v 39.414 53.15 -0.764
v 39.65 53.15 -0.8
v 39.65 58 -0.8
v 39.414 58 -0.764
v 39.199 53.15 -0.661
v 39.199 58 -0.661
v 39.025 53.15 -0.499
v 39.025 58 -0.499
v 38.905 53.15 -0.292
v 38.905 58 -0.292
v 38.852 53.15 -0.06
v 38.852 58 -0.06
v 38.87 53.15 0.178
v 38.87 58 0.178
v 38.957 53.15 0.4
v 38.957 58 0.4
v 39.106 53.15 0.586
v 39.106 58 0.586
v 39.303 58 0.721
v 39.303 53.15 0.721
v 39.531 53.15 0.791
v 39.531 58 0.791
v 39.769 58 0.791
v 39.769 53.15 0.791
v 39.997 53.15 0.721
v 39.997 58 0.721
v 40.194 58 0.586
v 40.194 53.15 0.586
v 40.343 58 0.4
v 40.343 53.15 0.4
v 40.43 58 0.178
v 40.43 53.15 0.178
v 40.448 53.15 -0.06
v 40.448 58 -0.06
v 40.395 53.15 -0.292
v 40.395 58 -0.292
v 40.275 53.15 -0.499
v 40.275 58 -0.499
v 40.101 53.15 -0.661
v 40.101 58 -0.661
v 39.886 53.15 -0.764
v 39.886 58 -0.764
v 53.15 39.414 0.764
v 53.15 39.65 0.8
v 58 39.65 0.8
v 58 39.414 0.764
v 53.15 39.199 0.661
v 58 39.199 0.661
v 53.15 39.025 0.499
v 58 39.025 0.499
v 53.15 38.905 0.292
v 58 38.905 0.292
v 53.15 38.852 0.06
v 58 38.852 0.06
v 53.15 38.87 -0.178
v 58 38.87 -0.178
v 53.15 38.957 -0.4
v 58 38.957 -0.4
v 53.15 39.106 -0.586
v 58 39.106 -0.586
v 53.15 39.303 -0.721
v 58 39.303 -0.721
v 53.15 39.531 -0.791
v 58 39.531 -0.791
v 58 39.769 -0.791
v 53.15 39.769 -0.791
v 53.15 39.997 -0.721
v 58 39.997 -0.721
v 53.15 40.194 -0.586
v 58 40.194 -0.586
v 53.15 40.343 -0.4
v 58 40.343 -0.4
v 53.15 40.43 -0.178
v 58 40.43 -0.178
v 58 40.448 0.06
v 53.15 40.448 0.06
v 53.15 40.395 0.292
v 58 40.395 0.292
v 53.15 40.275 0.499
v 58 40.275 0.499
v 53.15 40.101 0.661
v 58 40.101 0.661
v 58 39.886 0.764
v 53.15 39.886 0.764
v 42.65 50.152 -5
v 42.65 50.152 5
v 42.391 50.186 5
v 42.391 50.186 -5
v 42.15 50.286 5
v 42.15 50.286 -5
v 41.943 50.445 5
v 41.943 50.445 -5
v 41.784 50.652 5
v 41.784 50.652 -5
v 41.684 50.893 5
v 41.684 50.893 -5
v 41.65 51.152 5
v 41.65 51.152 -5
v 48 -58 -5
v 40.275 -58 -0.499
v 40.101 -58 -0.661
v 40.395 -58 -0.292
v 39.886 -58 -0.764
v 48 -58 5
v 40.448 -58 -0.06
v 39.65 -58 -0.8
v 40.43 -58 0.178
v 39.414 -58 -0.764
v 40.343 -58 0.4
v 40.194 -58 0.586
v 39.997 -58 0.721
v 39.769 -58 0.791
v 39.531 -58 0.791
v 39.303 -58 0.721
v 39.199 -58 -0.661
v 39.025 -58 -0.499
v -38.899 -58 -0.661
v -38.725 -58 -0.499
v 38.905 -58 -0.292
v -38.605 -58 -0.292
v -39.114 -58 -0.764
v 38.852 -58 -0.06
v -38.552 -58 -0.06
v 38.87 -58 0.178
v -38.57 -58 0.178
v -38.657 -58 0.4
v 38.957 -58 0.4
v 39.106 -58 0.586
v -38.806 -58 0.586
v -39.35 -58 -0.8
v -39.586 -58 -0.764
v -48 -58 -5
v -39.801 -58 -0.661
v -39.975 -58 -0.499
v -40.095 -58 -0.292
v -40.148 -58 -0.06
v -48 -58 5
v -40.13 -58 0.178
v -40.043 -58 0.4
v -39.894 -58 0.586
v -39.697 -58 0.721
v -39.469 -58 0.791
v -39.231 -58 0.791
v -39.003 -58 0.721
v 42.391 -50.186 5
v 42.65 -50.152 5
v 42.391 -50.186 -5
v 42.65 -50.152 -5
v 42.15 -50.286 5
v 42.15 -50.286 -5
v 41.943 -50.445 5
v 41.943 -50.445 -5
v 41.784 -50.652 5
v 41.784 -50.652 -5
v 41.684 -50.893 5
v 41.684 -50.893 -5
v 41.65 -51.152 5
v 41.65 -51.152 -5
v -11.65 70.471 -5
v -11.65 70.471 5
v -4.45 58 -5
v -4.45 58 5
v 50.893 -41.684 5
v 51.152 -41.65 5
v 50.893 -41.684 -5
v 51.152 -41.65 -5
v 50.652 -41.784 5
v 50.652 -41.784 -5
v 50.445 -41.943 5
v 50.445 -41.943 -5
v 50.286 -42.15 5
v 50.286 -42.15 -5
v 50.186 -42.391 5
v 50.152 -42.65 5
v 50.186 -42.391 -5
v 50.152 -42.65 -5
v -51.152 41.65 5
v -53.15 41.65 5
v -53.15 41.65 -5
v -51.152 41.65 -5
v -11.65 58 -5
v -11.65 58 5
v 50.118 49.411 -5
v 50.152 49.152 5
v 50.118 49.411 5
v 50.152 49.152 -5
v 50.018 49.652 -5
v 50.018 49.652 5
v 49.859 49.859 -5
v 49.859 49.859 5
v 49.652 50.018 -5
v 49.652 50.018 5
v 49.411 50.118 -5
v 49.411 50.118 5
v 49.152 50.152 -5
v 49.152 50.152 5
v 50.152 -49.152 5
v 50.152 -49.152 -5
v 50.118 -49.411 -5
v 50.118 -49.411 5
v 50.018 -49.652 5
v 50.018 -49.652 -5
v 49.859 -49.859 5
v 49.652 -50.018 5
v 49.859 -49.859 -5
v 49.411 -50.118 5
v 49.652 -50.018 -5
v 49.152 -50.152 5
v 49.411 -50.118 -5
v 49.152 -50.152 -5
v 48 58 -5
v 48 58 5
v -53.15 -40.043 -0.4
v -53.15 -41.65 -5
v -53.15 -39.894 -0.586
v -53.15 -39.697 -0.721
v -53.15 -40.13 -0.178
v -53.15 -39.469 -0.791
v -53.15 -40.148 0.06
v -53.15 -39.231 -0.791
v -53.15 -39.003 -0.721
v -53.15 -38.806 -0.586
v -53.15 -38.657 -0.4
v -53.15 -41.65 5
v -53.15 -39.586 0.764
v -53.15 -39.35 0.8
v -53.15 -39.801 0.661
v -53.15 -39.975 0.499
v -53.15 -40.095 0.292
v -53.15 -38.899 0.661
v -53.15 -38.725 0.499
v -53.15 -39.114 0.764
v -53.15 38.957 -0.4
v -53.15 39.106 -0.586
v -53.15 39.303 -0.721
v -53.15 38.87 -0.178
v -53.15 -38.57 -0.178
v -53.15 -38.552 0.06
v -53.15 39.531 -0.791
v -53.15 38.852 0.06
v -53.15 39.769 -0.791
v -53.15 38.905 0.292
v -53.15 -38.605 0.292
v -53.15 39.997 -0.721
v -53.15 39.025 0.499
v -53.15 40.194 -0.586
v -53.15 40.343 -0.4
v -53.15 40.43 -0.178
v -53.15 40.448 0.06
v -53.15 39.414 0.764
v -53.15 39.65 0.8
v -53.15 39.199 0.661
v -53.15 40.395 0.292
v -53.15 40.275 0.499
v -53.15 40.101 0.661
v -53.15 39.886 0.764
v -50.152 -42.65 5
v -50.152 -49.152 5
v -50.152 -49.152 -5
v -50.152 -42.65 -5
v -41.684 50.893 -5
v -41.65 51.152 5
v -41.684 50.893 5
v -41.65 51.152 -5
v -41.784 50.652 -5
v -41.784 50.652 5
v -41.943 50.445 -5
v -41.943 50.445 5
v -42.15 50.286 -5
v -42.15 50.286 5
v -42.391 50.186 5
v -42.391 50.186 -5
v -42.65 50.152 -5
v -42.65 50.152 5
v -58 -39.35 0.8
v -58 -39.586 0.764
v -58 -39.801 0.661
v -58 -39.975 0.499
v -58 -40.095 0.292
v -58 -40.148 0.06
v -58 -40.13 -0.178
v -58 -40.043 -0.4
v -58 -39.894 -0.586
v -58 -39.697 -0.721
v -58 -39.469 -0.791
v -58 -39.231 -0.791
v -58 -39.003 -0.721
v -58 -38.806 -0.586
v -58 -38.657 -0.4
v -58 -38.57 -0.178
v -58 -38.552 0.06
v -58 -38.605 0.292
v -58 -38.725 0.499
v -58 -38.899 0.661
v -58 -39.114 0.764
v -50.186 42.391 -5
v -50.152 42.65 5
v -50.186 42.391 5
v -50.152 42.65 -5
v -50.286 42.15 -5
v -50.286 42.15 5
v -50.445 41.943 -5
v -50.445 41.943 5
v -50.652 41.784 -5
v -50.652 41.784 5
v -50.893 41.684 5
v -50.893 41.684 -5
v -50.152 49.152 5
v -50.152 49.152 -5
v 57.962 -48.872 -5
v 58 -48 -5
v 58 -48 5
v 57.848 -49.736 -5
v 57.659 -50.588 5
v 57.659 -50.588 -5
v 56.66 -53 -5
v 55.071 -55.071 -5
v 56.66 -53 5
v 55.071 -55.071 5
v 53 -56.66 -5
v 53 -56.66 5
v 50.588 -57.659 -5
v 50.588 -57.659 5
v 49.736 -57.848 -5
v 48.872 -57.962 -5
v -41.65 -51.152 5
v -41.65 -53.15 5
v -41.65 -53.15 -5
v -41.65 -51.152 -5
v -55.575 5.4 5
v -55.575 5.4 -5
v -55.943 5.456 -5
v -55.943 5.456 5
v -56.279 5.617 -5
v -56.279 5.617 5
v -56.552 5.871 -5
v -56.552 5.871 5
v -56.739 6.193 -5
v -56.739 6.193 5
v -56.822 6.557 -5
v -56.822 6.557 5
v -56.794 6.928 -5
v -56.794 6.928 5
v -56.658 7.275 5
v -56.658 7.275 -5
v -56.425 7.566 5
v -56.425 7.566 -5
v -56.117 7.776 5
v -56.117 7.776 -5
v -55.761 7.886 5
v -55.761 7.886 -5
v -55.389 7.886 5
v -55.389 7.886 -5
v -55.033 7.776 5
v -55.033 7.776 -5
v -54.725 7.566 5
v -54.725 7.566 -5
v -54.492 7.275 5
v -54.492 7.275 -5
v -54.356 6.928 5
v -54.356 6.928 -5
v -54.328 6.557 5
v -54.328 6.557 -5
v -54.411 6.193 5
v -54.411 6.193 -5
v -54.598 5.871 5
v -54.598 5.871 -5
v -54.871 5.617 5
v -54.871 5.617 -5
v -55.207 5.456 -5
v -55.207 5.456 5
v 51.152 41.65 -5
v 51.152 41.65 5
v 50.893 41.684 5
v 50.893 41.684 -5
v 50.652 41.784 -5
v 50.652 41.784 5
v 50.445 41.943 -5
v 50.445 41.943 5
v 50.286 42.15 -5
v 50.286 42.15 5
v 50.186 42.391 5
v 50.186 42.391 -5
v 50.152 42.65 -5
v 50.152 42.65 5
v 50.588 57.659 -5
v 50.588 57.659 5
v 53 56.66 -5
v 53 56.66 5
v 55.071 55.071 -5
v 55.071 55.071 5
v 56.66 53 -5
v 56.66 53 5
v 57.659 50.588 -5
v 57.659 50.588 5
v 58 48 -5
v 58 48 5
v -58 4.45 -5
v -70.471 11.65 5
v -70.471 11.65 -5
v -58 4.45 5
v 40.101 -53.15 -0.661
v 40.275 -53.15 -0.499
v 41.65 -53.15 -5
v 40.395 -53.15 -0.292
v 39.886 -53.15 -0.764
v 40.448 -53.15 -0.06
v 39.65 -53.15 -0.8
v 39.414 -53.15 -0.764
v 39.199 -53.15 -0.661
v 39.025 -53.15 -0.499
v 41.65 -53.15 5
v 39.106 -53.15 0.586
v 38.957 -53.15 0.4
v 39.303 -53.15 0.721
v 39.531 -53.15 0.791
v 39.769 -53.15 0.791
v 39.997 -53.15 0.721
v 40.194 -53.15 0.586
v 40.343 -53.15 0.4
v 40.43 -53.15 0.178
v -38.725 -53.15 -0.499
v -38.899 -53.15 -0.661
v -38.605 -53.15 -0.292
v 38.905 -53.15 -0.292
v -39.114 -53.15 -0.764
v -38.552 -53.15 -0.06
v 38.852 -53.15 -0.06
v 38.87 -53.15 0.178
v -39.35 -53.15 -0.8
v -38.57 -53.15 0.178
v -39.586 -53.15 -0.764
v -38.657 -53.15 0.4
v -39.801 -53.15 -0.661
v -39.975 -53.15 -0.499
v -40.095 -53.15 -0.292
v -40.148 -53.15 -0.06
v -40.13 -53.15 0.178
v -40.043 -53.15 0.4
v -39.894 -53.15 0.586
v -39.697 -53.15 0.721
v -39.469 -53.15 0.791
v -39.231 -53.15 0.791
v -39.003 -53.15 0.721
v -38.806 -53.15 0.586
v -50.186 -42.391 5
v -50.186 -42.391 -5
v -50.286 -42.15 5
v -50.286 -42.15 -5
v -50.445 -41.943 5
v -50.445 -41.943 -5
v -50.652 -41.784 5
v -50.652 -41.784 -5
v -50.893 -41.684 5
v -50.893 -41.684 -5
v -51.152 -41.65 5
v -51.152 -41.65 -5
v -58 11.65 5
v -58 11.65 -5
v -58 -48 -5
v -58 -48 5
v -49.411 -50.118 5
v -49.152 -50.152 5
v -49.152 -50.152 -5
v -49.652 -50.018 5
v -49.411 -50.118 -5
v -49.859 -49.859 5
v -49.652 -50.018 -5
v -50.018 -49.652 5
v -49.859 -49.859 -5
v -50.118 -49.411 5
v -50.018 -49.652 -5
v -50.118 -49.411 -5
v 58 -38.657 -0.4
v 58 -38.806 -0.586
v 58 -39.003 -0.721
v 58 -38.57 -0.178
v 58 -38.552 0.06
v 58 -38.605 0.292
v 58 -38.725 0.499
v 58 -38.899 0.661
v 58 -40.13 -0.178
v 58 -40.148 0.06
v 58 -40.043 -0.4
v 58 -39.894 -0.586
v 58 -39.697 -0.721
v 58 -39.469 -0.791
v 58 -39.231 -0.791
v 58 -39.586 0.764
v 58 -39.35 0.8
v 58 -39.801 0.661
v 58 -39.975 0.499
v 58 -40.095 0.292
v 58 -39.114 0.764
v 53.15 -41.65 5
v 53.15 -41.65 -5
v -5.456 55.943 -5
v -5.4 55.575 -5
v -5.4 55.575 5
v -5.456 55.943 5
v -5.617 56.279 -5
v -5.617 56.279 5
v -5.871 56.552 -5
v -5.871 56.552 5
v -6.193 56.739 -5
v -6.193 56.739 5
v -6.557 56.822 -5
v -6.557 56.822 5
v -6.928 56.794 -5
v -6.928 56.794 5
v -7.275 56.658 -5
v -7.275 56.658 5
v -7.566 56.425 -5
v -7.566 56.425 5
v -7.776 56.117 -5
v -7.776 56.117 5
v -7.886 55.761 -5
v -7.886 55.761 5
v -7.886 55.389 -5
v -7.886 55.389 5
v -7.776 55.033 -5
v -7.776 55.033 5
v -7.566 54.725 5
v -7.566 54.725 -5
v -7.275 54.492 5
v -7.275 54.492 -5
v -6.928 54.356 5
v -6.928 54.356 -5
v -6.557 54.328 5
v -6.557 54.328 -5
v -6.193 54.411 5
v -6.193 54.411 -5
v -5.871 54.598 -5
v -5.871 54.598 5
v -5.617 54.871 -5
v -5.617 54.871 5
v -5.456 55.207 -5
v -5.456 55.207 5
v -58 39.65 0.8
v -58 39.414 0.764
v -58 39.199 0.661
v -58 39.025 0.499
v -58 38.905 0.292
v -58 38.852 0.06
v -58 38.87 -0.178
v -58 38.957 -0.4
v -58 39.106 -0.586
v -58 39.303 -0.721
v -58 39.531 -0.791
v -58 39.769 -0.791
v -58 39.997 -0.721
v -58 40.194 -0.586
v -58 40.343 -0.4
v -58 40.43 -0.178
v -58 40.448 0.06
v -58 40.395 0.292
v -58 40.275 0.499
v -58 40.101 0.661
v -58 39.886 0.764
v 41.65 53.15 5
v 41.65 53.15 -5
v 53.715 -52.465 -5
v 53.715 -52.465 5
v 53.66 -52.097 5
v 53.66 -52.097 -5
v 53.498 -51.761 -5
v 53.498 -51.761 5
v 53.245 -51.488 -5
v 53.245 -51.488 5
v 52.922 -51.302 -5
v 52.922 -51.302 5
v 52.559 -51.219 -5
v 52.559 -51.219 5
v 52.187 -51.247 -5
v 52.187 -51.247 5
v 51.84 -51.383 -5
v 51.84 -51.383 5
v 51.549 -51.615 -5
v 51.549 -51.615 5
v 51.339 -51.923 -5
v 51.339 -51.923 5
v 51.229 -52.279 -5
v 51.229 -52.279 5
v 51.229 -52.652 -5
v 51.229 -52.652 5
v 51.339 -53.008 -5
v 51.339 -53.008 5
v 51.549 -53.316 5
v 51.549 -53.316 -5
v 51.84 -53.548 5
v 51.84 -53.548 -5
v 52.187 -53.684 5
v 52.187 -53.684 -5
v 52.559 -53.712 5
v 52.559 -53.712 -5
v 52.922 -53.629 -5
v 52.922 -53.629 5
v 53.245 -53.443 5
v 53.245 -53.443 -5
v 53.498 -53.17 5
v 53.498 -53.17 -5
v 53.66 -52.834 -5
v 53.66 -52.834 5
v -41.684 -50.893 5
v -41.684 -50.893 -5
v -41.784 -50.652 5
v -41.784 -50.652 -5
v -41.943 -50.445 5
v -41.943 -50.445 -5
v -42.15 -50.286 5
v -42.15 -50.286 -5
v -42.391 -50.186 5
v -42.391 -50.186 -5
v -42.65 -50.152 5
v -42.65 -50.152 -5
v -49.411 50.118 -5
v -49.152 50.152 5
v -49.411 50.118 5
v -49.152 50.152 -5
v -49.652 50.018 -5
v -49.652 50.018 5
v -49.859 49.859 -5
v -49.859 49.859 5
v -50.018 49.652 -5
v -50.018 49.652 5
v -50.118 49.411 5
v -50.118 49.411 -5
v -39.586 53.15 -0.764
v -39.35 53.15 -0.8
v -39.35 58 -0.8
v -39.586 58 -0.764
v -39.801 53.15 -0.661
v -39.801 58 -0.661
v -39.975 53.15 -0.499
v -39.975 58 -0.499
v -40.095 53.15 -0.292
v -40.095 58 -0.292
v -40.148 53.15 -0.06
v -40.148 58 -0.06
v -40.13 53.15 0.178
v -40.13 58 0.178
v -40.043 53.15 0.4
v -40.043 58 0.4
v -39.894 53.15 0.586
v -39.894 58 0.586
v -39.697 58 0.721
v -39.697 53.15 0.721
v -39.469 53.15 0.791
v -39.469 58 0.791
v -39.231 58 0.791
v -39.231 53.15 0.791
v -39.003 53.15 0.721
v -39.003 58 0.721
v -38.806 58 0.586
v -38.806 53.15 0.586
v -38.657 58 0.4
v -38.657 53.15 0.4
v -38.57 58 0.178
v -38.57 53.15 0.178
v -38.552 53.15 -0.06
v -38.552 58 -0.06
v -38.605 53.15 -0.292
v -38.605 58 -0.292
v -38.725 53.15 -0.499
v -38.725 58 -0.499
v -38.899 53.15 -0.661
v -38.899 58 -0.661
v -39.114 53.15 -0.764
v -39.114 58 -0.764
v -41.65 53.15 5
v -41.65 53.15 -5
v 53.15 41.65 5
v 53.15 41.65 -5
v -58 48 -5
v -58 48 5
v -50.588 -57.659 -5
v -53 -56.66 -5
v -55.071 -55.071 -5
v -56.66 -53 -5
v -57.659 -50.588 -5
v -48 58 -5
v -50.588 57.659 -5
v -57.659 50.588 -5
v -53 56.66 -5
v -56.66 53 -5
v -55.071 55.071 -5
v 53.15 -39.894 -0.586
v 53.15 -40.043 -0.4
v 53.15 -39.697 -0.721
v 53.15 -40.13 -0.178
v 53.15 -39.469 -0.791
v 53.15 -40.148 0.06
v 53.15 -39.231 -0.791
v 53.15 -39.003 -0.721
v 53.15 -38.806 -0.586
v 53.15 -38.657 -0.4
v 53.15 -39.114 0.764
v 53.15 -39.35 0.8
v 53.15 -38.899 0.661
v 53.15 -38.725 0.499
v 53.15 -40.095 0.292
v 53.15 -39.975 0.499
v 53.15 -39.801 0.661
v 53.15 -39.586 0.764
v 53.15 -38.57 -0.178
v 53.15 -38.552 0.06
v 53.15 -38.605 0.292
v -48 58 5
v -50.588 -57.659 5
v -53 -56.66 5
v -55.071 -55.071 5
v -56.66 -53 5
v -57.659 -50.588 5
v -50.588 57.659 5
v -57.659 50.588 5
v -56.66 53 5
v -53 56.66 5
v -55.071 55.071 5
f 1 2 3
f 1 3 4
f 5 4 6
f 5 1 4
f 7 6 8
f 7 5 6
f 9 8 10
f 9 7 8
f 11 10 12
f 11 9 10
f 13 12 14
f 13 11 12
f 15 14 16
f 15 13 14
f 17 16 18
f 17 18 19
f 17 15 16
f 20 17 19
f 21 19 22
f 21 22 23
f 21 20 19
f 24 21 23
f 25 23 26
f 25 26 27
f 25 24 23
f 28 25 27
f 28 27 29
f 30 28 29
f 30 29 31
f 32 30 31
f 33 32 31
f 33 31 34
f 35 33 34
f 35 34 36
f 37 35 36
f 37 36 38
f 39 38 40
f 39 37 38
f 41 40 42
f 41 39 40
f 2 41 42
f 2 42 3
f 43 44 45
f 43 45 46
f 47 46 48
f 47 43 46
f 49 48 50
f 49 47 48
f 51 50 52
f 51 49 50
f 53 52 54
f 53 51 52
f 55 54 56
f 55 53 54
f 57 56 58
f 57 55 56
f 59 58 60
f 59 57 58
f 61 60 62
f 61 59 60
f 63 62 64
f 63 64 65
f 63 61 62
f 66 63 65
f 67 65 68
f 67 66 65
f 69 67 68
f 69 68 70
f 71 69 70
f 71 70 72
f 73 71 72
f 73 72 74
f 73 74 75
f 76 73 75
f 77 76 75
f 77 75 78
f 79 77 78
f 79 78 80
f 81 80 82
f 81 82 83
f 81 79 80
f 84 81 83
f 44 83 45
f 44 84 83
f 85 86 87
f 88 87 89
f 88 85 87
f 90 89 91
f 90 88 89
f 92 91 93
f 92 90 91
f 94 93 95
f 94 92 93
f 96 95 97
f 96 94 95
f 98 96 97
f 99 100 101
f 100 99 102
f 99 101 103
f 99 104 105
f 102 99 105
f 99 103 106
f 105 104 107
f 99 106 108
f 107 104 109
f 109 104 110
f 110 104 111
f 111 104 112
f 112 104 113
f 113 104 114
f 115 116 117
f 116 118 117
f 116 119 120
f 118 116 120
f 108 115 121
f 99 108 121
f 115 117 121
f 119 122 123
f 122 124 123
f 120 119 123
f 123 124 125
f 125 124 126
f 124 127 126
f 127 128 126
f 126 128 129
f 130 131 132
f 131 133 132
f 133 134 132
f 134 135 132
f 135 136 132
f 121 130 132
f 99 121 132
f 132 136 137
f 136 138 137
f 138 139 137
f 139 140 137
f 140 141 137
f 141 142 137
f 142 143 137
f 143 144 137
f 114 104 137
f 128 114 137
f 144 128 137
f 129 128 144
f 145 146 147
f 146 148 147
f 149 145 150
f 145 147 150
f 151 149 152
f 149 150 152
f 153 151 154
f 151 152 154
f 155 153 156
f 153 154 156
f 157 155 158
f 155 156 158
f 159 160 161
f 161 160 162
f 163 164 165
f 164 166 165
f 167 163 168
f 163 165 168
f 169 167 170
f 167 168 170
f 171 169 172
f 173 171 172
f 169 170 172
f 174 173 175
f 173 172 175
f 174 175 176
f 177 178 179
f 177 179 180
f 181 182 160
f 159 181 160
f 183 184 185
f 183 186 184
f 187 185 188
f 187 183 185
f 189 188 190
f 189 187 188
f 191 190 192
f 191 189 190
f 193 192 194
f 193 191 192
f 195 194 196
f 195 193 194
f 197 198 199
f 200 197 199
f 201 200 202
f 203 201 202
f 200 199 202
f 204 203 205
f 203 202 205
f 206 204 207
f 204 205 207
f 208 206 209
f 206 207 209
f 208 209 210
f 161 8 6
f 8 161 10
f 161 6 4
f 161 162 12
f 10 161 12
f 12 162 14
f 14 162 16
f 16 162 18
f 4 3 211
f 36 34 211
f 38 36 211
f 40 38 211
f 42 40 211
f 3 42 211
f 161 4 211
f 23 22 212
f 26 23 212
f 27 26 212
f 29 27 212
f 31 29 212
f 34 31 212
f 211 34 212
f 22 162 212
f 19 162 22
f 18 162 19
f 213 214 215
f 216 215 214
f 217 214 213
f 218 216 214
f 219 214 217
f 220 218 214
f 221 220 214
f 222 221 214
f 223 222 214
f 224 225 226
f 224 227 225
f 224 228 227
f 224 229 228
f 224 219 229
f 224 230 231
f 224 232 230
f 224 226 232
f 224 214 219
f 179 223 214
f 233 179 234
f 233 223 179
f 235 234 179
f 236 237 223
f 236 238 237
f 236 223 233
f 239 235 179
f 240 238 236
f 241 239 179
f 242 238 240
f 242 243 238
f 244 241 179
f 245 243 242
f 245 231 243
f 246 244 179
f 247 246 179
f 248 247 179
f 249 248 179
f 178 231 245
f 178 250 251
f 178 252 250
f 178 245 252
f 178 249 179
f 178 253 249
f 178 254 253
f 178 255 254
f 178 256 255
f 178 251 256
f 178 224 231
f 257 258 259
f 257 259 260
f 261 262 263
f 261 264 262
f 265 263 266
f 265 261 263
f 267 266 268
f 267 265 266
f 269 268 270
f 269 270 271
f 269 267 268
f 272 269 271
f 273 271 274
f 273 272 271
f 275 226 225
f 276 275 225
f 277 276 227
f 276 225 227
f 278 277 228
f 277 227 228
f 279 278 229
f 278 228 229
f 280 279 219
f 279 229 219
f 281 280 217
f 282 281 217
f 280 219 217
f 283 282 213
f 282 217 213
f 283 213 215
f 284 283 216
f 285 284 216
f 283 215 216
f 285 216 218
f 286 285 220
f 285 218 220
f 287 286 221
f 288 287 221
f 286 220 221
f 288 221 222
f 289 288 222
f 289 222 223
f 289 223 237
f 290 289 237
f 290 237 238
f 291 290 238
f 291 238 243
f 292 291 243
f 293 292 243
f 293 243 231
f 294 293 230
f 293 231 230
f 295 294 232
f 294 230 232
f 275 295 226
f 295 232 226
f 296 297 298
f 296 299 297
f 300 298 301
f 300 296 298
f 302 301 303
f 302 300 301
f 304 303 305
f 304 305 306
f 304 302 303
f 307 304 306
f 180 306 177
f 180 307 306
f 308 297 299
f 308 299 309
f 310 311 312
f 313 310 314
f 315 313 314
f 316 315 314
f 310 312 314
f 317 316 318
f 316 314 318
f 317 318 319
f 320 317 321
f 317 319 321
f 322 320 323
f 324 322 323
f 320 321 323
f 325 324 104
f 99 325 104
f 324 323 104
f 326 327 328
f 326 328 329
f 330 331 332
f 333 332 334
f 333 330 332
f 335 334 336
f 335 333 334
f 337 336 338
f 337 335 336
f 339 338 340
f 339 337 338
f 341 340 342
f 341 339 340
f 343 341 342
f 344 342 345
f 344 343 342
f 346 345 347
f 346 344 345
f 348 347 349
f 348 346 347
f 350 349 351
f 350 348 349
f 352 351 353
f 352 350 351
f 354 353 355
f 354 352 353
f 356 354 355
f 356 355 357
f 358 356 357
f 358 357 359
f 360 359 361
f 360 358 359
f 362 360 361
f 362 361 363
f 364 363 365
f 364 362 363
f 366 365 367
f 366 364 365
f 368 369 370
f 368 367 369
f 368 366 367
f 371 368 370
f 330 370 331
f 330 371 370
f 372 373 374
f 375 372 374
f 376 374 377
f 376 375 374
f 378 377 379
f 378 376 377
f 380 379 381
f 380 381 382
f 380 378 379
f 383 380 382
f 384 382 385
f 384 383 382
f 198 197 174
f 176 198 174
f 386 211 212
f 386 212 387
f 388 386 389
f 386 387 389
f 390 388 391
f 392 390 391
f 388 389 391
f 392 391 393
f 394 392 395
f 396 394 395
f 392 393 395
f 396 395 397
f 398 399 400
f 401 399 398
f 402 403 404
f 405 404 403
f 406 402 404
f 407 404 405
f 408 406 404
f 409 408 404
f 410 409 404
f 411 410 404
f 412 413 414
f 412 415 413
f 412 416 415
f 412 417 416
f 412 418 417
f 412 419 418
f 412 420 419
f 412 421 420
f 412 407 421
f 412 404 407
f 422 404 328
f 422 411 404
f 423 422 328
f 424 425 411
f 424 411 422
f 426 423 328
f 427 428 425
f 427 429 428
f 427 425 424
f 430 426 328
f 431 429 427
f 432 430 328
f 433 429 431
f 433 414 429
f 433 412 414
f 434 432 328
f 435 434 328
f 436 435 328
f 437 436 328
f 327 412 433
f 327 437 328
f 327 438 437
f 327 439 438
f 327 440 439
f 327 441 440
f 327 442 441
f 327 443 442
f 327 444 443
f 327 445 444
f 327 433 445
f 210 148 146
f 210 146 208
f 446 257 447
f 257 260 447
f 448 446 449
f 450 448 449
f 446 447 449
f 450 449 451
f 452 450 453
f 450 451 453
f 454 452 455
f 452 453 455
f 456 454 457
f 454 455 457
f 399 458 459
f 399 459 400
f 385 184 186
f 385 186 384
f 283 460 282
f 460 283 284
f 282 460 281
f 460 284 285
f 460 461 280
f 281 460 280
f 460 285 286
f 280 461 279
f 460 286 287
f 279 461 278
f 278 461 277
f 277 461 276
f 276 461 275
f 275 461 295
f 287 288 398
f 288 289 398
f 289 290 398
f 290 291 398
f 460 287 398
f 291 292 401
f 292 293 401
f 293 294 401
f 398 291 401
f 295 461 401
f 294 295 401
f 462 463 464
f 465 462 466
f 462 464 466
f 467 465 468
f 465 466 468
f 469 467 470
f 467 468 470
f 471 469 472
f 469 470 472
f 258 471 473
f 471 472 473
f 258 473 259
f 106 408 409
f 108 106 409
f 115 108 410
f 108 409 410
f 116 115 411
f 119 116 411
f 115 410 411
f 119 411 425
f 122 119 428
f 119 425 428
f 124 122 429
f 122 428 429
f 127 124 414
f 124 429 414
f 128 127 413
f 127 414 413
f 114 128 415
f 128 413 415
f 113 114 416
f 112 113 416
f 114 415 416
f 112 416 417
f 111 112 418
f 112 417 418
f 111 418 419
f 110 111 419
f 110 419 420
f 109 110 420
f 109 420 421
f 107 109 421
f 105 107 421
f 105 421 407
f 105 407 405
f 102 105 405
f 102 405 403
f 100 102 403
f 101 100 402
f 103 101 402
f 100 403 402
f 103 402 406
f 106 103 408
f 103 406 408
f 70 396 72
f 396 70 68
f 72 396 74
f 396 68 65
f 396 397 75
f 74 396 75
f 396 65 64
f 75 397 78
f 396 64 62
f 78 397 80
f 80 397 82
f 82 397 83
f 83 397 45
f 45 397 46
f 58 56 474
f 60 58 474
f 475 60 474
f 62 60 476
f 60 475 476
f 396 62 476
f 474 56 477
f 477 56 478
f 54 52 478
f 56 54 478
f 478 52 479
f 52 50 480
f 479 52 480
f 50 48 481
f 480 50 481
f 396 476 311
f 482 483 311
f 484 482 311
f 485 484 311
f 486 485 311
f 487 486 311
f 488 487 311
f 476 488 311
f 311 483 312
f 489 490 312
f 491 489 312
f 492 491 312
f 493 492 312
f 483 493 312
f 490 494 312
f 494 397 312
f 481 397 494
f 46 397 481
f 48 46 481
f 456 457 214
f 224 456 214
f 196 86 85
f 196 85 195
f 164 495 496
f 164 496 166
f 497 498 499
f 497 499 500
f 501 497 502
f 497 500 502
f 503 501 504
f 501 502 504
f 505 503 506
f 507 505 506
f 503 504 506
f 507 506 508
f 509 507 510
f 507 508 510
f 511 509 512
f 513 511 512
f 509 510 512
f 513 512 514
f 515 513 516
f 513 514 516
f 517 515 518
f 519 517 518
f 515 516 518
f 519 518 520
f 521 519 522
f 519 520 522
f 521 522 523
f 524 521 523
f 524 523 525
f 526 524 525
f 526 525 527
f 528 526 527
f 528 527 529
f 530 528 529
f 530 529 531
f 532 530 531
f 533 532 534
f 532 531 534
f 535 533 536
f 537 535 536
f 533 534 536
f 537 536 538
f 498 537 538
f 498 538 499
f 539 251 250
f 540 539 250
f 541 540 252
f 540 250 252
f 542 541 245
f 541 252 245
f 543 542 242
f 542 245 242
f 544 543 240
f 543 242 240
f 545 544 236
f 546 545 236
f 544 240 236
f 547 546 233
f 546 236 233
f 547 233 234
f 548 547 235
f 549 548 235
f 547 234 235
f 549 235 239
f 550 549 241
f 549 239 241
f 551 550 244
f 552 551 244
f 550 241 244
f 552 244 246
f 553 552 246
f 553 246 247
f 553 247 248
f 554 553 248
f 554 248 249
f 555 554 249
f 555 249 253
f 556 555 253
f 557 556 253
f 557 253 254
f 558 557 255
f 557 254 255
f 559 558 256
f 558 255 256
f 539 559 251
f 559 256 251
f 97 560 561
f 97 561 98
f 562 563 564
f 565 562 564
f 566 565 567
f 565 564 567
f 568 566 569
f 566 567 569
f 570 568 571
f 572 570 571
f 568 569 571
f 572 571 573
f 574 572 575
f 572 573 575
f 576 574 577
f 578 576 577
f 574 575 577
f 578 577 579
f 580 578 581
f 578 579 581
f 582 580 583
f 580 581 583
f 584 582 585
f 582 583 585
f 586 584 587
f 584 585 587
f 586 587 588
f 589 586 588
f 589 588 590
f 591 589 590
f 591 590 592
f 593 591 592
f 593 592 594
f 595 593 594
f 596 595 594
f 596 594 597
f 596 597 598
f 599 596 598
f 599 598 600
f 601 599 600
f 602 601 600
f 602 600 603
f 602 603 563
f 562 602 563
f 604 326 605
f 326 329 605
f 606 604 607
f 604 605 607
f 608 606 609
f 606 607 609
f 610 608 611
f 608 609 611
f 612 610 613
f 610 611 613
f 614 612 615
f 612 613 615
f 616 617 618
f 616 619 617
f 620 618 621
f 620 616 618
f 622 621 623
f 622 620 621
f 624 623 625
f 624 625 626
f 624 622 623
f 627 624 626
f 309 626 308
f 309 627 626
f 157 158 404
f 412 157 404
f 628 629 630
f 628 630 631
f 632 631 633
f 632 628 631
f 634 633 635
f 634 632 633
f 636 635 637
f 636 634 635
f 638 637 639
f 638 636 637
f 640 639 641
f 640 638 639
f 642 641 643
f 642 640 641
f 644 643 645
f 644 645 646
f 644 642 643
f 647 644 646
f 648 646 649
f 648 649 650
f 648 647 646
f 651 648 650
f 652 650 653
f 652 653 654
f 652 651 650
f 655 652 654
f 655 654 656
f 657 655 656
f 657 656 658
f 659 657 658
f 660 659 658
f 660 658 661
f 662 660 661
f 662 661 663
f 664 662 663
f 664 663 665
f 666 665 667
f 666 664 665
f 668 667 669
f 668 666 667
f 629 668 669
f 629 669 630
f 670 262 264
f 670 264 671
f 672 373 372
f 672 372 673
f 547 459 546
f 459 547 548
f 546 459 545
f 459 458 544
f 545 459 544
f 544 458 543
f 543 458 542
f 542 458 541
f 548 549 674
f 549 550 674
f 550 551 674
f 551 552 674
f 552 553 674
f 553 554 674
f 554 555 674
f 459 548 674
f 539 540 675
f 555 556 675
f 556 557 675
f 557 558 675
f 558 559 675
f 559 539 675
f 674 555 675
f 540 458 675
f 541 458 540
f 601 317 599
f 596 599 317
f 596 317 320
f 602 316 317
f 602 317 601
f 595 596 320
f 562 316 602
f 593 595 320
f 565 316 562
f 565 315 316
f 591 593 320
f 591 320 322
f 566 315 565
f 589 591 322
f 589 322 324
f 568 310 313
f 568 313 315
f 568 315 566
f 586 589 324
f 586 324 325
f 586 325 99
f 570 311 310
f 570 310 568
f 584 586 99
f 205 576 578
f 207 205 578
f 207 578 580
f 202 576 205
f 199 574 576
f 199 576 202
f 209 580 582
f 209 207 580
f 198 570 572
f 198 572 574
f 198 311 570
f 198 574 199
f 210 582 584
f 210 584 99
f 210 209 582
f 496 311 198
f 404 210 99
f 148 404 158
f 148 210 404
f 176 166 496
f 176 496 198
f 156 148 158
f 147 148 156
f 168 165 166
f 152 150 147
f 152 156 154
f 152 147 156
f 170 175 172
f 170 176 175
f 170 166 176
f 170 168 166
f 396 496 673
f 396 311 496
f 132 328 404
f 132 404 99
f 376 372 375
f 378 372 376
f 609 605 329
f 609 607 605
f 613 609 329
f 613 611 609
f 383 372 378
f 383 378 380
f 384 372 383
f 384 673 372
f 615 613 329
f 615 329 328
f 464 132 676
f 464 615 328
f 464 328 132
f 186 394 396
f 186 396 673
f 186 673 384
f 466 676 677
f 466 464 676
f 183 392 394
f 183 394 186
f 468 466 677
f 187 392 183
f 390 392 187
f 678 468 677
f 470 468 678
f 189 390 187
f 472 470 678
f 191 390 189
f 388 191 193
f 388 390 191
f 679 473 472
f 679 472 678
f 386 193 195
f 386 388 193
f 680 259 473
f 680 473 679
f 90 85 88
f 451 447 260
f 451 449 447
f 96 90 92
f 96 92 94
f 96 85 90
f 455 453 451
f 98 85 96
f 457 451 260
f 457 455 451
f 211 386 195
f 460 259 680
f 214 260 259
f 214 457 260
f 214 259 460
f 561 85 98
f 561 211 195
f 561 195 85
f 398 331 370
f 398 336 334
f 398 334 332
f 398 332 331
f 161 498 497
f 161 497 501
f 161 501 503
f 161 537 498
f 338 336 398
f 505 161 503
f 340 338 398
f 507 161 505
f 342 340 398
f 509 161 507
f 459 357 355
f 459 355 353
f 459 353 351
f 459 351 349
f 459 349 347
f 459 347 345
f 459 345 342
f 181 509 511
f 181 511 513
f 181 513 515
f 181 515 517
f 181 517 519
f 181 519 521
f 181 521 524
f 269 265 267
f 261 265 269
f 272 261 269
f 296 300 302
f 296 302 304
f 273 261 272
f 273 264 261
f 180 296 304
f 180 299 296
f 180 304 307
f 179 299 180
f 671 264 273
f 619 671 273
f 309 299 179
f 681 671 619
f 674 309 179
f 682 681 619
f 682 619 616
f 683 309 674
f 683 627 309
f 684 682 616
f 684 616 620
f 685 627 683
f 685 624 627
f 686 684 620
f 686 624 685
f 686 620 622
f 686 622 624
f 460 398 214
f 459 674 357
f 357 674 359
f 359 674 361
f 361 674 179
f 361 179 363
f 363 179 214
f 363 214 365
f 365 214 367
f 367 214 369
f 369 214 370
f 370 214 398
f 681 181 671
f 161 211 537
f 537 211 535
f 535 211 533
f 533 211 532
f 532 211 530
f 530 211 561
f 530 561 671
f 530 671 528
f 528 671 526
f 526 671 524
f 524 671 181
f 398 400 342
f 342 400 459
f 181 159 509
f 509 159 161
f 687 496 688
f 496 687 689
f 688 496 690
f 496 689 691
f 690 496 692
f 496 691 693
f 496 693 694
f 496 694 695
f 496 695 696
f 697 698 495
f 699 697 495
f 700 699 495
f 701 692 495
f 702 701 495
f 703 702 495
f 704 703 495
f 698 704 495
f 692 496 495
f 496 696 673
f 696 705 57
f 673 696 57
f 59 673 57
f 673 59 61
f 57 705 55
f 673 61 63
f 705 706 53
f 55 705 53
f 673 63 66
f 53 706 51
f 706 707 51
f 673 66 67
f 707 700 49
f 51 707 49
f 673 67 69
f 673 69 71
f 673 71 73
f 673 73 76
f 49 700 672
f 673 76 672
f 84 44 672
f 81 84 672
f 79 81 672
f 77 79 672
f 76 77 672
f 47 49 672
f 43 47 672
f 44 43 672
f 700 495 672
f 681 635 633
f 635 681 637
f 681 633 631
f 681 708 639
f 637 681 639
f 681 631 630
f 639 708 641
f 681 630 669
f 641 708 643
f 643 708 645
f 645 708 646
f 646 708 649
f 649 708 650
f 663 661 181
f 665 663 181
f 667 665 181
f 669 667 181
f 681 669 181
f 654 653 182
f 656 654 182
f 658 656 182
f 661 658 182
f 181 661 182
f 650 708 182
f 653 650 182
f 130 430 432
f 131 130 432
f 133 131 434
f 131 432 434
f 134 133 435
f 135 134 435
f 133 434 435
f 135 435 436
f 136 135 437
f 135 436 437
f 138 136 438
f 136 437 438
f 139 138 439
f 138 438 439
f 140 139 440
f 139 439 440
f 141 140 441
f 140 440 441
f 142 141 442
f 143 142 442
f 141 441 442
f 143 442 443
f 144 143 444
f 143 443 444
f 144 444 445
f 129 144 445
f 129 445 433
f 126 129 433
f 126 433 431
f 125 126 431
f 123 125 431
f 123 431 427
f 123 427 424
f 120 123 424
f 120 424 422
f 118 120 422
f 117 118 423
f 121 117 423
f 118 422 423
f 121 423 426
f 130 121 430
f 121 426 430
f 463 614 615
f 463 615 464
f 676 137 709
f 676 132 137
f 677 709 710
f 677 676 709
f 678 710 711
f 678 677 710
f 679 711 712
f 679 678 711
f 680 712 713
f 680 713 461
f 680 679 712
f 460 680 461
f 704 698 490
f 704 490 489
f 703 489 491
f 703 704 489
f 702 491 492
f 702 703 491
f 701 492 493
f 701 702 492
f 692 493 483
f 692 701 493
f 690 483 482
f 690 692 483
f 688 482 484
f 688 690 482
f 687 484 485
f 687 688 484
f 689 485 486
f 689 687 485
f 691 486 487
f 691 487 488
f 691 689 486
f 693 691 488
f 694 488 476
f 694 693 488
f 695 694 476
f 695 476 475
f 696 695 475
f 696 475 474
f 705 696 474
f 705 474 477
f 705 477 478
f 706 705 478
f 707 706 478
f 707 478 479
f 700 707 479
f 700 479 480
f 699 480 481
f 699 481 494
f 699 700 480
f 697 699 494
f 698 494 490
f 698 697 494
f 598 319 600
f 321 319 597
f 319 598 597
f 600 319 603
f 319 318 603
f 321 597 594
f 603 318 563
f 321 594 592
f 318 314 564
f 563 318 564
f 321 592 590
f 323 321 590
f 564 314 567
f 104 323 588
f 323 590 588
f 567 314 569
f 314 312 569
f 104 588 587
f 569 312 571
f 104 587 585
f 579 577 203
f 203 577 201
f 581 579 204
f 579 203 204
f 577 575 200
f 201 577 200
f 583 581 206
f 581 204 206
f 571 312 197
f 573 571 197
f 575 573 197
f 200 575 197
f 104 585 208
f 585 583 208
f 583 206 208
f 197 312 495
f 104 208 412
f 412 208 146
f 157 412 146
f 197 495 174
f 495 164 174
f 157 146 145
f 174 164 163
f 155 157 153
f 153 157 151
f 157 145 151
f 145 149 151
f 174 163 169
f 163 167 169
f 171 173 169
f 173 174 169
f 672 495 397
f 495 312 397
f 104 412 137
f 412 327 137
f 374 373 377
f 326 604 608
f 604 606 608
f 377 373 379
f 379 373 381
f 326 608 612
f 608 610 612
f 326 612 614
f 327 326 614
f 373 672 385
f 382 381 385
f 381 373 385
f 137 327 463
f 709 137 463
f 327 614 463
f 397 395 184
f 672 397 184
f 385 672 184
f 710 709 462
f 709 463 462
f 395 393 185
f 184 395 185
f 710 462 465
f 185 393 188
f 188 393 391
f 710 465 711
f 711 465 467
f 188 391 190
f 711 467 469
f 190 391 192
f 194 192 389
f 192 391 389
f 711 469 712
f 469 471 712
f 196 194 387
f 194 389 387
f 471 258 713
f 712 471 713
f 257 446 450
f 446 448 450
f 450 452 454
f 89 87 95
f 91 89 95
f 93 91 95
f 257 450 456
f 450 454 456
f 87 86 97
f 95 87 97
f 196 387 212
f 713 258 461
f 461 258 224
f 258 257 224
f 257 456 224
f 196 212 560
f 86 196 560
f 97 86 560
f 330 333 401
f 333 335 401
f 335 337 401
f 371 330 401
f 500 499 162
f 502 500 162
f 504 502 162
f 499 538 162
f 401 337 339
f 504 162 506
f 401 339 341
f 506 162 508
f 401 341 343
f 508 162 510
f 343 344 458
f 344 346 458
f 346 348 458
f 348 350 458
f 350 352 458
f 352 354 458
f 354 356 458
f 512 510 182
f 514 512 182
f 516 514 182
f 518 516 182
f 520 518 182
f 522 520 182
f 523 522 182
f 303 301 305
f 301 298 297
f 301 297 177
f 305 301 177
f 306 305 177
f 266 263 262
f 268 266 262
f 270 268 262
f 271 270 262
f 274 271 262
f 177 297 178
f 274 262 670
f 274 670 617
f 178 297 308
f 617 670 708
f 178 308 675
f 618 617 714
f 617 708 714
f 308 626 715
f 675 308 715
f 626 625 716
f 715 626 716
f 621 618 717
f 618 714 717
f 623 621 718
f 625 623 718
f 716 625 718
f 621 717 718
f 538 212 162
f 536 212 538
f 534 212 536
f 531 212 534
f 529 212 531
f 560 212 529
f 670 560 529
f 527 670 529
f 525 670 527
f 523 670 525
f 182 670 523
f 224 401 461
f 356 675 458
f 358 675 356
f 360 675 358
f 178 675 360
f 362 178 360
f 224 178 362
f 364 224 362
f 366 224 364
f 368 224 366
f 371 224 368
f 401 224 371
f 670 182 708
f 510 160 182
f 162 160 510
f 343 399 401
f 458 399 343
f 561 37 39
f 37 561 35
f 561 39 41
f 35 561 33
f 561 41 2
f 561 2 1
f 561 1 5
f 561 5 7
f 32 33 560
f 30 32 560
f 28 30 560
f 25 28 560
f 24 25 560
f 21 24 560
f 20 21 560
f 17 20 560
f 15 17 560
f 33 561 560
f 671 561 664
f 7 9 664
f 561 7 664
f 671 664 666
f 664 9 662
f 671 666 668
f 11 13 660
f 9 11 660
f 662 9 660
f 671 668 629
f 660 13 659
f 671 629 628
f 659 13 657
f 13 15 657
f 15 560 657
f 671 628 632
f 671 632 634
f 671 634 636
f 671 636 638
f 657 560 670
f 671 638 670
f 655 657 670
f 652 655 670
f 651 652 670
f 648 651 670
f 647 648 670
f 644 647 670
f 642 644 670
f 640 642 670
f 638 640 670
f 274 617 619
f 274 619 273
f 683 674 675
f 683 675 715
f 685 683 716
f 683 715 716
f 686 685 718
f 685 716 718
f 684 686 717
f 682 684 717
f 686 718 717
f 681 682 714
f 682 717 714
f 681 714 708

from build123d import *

# Parameters (mm, degrees)
BASE_DEPTH                       = 5
ARM_DEPTH                        = 5
CUT_EXTRUDE1_DEPTH               = 98.51535195125132
BOSS_EXTRUDE4_DEPTH              = 28
CLEARANCE_DEPTH                  = 20
M2X0_4_TAPPED_HOLE1_AT_2_COUNT   = 2
M2X0_4_TAPPED_HOLE1_AT_2_PITCH   = 79
M2X0_4_TAPPED_HOLE2_AT_2_COUNT   = 2
M2X0_4_TAPPED_HOLE2_AT_2_PITCH   = 79
EXTENDER_DEPTH                   = 29
ANGLED_HORIZONTAL_DEPTH          = 10
ARM_START                        = -5
ARM_HOLDER_DEPTH                 = 10
FILLET1_R                        = 1
FILLET2_R                        = 10
M3X0_5_TAPPED_HOLE2_D            = 2.5
BOSS_EXTRUDE18_REACH             = 170.267
SKETCH39_W                       = 4.000000000000028
SKETCH39_H                       = 10.000000000000007
BOSS_EXTRUDE18_DIRECTION_2_REACH = 170.267
SHIM_SUPPORT_ARM_DEPTH           = 6.85
BOSS_EXTRUDE17_REACH             = 169.03
FILLET4_R                        = 2
SPLIT1_START                     = -44
SPLIT1_OUTLINE_R                 = 1.25
SPLIT1_DEPTH                     = 39


# Read off the part's stored shape, not the designer's step: Split1
with BuildPart() as part:
    # Sketch1 → base (new, symmetric)
    with BuildSketch(Plane.XY):
        Polygon((58.00000000000011, 58.00000000000005), (58.00000000000011, -58.00000000000005), (-58.00000000000008, -58.00000000000009), (-58.00000000000008, 58.00000000000009), align=None)
        Polygon((-41.5, 53.00000000000001), (41.5, 53.00000000000001), (41.5, 50.00188016), (50.00188015999998, 50.00188015999996), (50.00188015999998, 41.49999999999998), (52.999999999999986, 41.49999999999998), (52.999999999999986, -41.49999999999998), (50.00188015999996, -41.499999999999964), (50.00188015999999, -50.001880160000006), (41.499999999999964, -50.00188015999996), (41.49999999999998, -52.99999999999998), (-41.5, -53.00000000000001), (-41.5, -50.00188016), (-50.00188015999999, -50.001880160000006), (-50.00188015999996, -41.499999999999964), (-52.999999999999986, -41.49999999999998), (-52.999999999999986, 41.49999999999998), (-50.00188015999998, 41.49999999999998), (-50.00188015999998, 50.00188015999996), (-41.5, 50.00188016), align=None, mode=Mode.SUBTRACT)
    extrude(amount=BASE_DEPTH, both=True)

    # Sketch2 → arm (add, symmetric)
    with BuildSketch(Plane(origin=(0, 0, 0), x_dir=(0.7071067811865476, -0.7071067811865475, 0), z_dir=(0.7071067811865475, 0.7071067811865476, 0))):
        Polygon((70.9254691007821, 5), (82.02438661763962, 5), (82.02438661763962, 44), (32.02438661763962, 43.999999999999986), (32.02438661763962, 33), (70.9254691007821, 33), align=None)
    extrude(amount=ARM_DEPTH, both=True)

    # Sketch3 → Cut-Extrude1 (cut, through all)
    with BuildSketch(Plane.XY):
        Polygon((54.81801948466061, -61.889087296526085), (61.88908729652609, -54.81801948466061), (58.00000000000011, -50.928932188134624), (58.0000000000001, -58.00000000000005), (50.92893218813458, -58.00000000000006), align=None)
    extrude(amount=-CUT_EXTRUDE1_DEPTH, mode=Mode.SUBTRACT)

    # Sketch5 → Boss-Extrude4 (add)
    with BuildSketch(Plane(origin=(0, 0, -5), x_dir=(-1, 0, 0), z_dir=(0, 0, -1))):
        Polygon((-50.15188015999995, -50.151880159999976), (-46.61634625406723, -53.68741406593269), (-43.080812348134494, -50.15188015999998), align=None)
        Polygon((-53.68741406593271, -46.61634625406722), (-50.15188015999995, -50.151880159999976), (-50.15188015999996, -43.08081234813448), align=None)
    extrude(amount=BOSS_EXTRUDE4_DEPTH)

    # Sketch7 → clearance (cut)
    with BuildSketch(Plane.XY.offset(15)):
        Polygon((-41.65, 53.150000000000006), (41.649999999999984, 53.150000000000006), (41.649999999999984, 50.15188016), (50.151880159999976, 50.15188016), (50.151880159999976, 41.64999999999998), (53.149999999999984, 41.64999999999998), (53.14999999999999, -41.64999999999996), (50.15188015999996, -41.64999999999996), (50.15188015999996, -50.15188015999998), (41.64999999999998, -50.15188015999998), (41.64999999999998, -53.14999999999998), (-41.65, -53.149999999999984), (-41.65, -50.15188016), (-50.15188015999999, -50.15188016), (-50.15188015999999, -41.64999999999998), (-53.149999999999984, -41.64999999999998), (-53.149999999999984, 41.64999999999998), (-50.151880159999976, 41.64999999999998), (-50.151880159999976, 50.15188015999996), (-41.65, 50.15188015999996), align=None)
    extrude(amount=-CLEARANCE_DEPTH, mode=Mode.SUBTRACT)

    # Sketch12 → M2x0.4 Tapped Hole1 (revolve, cut)
    with BuildSketch(Plane(origin=(-39.350000000000016, 0, 0), x_dir=(0, 0, -1), z_dir=(1, 0, 0))):
        Polygon((0, 0), (-1.421e-14, 58.00000000000009), (0.7999999999999855, 58.00000000000009), (0.7999999999999883, -1.46e-15), align=None)
    m2x0_4_tapped_hole1 = revolve(axis=Axis((-39.350000000000016, -6.349999999999991, 0), (0, 1, 0)), mode=Mode.SUBTRACT)

    # M2x0.4 Tapped Hole1 at 2: M2x0.4 Tapped Hole1 ×2
    with Locations(*[(i * M2X0_4_TAPPED_HOLE1_AT_2_PITCH, 0, 0) for i in range(1, M2X0_4_TAPPED_HOLE1_AT_2_COUNT)]):
        add(m2x0_4_tapped_hole1, mode=Mode.SUBTRACT)

    # Mirror1: M2x0.4 Tapped Hole1 across plane
    add(m2x0_4_tapped_hole1.mirror(Plane.ZX), mode=Mode.SUBTRACT)

    # Mirror1 copy 1 sketch → Mirror1 copy 1 (revolve, cut)
    with BuildSketch(Plane(origin=(39.649999999999984, 0, 0), x_dir=(0, 0, -1), z_dir=(1, 0, 0))):
        Polygon((0, 0), (-1.421e-14, -58.00000000000009), (0.7999999999999855, -58.00000000000009), (0.7999999999999883, 1.46e-15), align=None)
    revolve(axis=Axis((39.649999999999984, 6.349999999999991, 0), (0, 1, 0)), mode=Mode.SUBTRACT)

    # Sketch15 → M2x0.4 Tapped Hole2 (revolve, cut)
    with BuildSketch(Plane.ZX.offset(39.65)):
        Polygon((0, 0), (-1.421e-14, 58.00000000000011), (0.7999999999999923, 58.00000000000011), (0.7999999999999883, -1.46e-15), align=None)
    m2x0_4_tapped_hole2 = revolve(axis=Axis((-6.349999999999991, 39.65, 0), (1, 0, 0)), mode=Mode.SUBTRACT)

    # M2x0.4 Tapped Hole2 at 2: M2x0.4 Tapped Hole2 ×2
    with Locations(*[(0, -i * M2X0_4_TAPPED_HOLE2_AT_2_PITCH, 0) for i in range(1, M2X0_4_TAPPED_HOLE2_AT_2_COUNT)]):
        add(m2x0_4_tapped_hole2, mode=Mode.SUBTRACT)

    # Mirror2: M2x0.4 Tapped Hole2 across plane
    add(m2x0_4_tapped_hole2.mirror(Plane(origin=(0, 0, 0), x_dir=(0, 0, 1), z_dir=(1, 0, 0))), mode=Mode.SUBTRACT)

    # Mirror2 copy 1 sketch → Mirror2 copy 1 (revolve, cut)
    with BuildSketch(Plane.ZX.offset(-39.35)):
        Polygon((0, 0), (-1.421e-14, -58.00000000000011), (0.7999999999999923, -58.00000000000011), (0.7999999999999883, 1.46e-15), align=None)
    revolve(axis=Axis((6.349999999999991, -39.35, 0), (1, 0, 0)), mode=Mode.SUBTRACT)

    # Sketch16 → extender (add)
    with BuildSketch(Plane(origin=(0, 0, -5), x_dir=(-1, 0, 0), z_dir=(0, 0, -1))):
        Polygon((53.149999999999984, 11.649999999999979), (70.47050807568874, 11.64999999999998), (53.14999999999998, 1.649999999999978), align=None)
    extender = extrude(amount=EXTENDER_DEPTH)

    # Sketch17 → angled horizontal (add)
    with BuildSketch(Plane(origin=(0, 0, -34), x_dir=(-1, 0, 0), z_dir=(0, 0, -1))):
        Polygon((106.18300858899104, 64.68300858899104), (114.84326262683541, 56.02275455114666), (70.47050807568874, 11.64999999999998), (53.14999999999998, 1.649999999999971), (53.149999999999984, 11.649999999999979), align=None)
    angled_horizontal = extrude(amount=ANGLED_HORIZONTAL_DEPTH)

    # Sketch21 → Arm Holder (add)
    with BuildSketch(Plane.XY.offset(ARM_START)):
        Polygon((-53.14999999999998, 1.649999999999971), (-53.14999999999999, 11.649999999999979), (-70.47050807568874, 11.649999999999979), align=None)
        Polygon((-11.649999999999986, 70.47050807568874), (-1.649999999999978, 53.14999999999997), (-11.649999999999986, 53.149999999999984), align=None)
    extrude(amount=ARM_HOLDER_DEPTH)

    # Fillet1
    fillet1_edges = [part.edges().sort_by_distance(p)[0] for p in [
        (50.15188015999996, -50.151880159999976, -14),
        (-41.65, 50.15188015999996, 0),
        (41.649999999999984, 50.15188016, 0),
        (50.151880159999976, 50.15188016, 0),
        (50.151880159999976, 41.64999999999998, 0),
        (50.15188015999996, -41.64999999999996, 0),
        (41.64999999999998, -50.15188015999998, 0),
        (-41.65, -50.15188016, 0),
        (-50.15188015999999, -50.15188016, 0),
        (-50.15188015999999, -41.64999999999998, 0),
        (-50.151880159999976, 41.64999999999998, 0),
        (-50.151880159999976, 50.15188015999996, 0),
    ]]
    fillet(fillet1_edges, radius=FILLET1_R)

    # Fillet2
    fillet2_edges = [part.edges().sort_by_distance(p)[0] for p in [
        (58.00000000000011, -58.00000000000005, -19.5),
        (58.00000000000011, 58.00000000000005, 0),
        (-58.00000000000008, 58.00000000000009, 0),
        (-58.00000000000008, -58.00000000000009, 0),
    ]]
    fillet(fillet2_edges, radius=FILLET2_R)

    # M3x0.5 Tapped Hole2 (through all)
    with Locations(Plane(origin=(-8.64e-15, 8.64e-15, -43.99999999999998), x_dir=(-1, 0, 1e-16), z_dir=(-1e-16, 1e-16, -1))):
        with Locations((-52.465379323, -52.465379323)):
            Hole(M3X0_5_TAPPED_HOLE2_D / 2)

    # Sketch38 → M3x0.5 Tapped Hole3 (revolve, cut)
    with BuildSketch(Plane(origin=(-55.57499999999998, 6.6499999999999755, 5), x_dir=(0, -1, 0), z_dir=(1, 0, 0))):
        Polygon((0, 0), (-7.49e-15, 30.561075773784445), (1.249999999999985, 29.810000000000002), (1.249999999999989, -1.4e-15), align=None)
    m3x0_5_tapped_hole3 = revolve(axis=Axis((-55.57499999999998, 6.6499999999999755, 11.34999999999999), (0, 0, -1)), mode=Mode.SUBTRACT)

    # U part of Outside arm: extender, angled horizontal, M3x0.5 Tapped Hole3 across plane
    add(extender.mirror(Plane(origin=(0, 0, 0), x_dir=(0, 0, 1), z_dir=(0.7071067811865475, 0.7071067811865476, 0))))
    add(angled_horizontal.mirror(Plane(origin=(0, 0, 0), x_dir=(0, 0, 1), z_dir=(0.7071067811865475, 0.7071067811865476, 0))))
    add(m3x0_5_tapped_hole3.mirror(Plane(origin=(0, 0, 0), x_dir=(0, 0, 1), z_dir=(0.7071067811865475, 0.7071067811865476, 0))), mode=Mode.SUBTRACT)

    # Sketch39 → Boss-Extrude18 (add, up to next)
    with BuildSketch(Plane(origin=(0, 0, 0), x_dir=(0.7071067811865476, -0.7071067811865475, 0), z_dir=(0.7071067811865475, 0.7071067811865476, 0)), mode=Mode.PRIVATE) as boss_extrude18_sk1:
        with Locations((-118.82051942088825, 39)):
            Rectangle(SKETCH39_W, SKETCH39_H)
    boss_extrude18_tool1 = extrude(boss_extrude18_sk1.sketch, amount=BOSS_EXTRUDE18_REACH, mode=Mode.PRIVATE) - part.part
    add(boss_extrude18_tool1.solids().sort_by_distance((-84.018795, 84.018795, -39))[0])

    # Sketch39 → Boss-Extrude18 direction 2 (add, up to next)
    with BuildSketch(Plane(origin=(0, 0, 0), x_dir=(0.7071067811865476, -0.7071067811865475, 0), z_dir=(0.7071067811865475, 0.7071067811865476, 0)), mode=Mode.PRIVATE) as boss_extrude18_direction_2_sk1:
        with Locations((-118.82051942088825, 39)):
            Rectangle(SKETCH39_W, SKETCH39_H)
    boss_extrude18_direction_2_tool1 = extrude(boss_extrude18_direction_2_sk1.sketch, amount=-BOSS_EXTRUDE18_DIRECTION_2_REACH, mode=Mode.PRIVATE) - part.part
    add(boss_extrude18_direction_2_tool1.solids().sort_by_distance((-84.018795, 84.018795, -39))[0])

    # Sketch34 → Shim support arm (add)
    with BuildSketch(Plane(origin=(27.06097651600918, -27.060976516009177, 0), x_dir=(0, 0, -1), z_dir=(0.7071067811865476, -0.7071067811865475, 0))):
        Polygon((43.99999999999999, 4.999999999999997), (33, 5.000000000000001), (9.000000000000005, 36.895450840129975), (19.999999999999986, 36.895450840129975), align=None)
    shim_support_arm = extrude(amount=SHIM_SUPPORT_ARM_DEPTH)

    # Boss-Extrude17: up to this face of the body (flat: up to its plane)
    boss_extrude17_end = Plane(part.part.faces().sort_by_distance((44.295095937, -14.670538547, -21))[0])
    # Sketch35 → Boss-Extrude17 (add, up to the picked face)
    with BuildSketch(Plane(origin=(0, 0, -5), x_dir=(-1, 0, 0), z_dir=(0, 0, -1)), mode=Mode.PRIVATE) as boss_extrude17_sk1:
        Polygon((-53.149999999999984, -0.971953032018356), (-57.99368145112784, -5.815634483146219), (-53.149999999999984, -10.659315934274082), align=None)
    boss_extrude17_tool1 = split(extrude(boss_extrude17_sk1.sketch, amount=BOSS_EXTRUDE17_REACH, mode=Mode.PRIVATE), bisect_by=boss_extrude17_end, keep=Keep.BOTH, mode=Mode.PRIVATE)
    boss_extrude17 = boss_extrude17_tool1.solids().sort_by(Axis((54.76456, -5.815634, -5), (0, 0, -1)))[0]
    add(boss_extrude17)

    # Mirror4: Shim support arm, Boss-Extrude17 across plane
    add(shim_support_arm.mirror(Plane(origin=(0, 0, 0), x_dir=(0, 0, 1), z_dir=(0.7071067811865475, 0.7071067811865476, 0))))
    add(boss_extrude17.mirror(Plane(origin=(0, 0, 0), x_dir=(0, 0, 1), z_dir=(0.7071067811865475, 0.7071067811865476, 0))))

    # Fillet4
    fillet4_edges = [part.edges().sort_by_distance(p)[0] for p in [
        (30.596510421941918, -23.52544261007644, -38.5),
        (55.57184072556391, -3.3937937575822943, -19.999999999999986),
        (35.440191873069764, -28.36912406120429, -38.5),
        (53.149999999999984, -5.815634483146219, -11.577170030046497),
        (3.3937937575823067, -55.57184072556391, -19.999999999999986),
        (28.369124061204293, -35.440191873069764, -38.5),
        (23.52544261007645, -30.596510421941908, -38.5),
        (5.815634483146232, -53.149999999999984, -11.577170030046497),
    ]]
    fillet(fillet4_edges, radius=FILLET4_R)

    # Split1 outline → Split1 (cut)
    # profile 1 of 2: a face of its own
    with BuildSketch(Plane.XY.offset(SPLIT1_START)):
        with BuildLine():
            ThreePointArc((50.588190451, -57.659258263), (55.071067812, -55.071067812), (57.659258263, -50.588190451))
            Line((57.659258263, -50.588190451), (36.854405435, -29.783337624))
            ThreePointArc((36.854405435, -29.783337624), (36.268618998, -28.369124062), (36.854405435, -26.954910499))
            Line((36.854405435, -26.954910499), (57.993681451, -5.815634483))
            Line((57.993681451, -5.815634483), (53.15, -0.971953032))
            Line((53.15, -0.971953032), (32.010723984, -22.111229048))
            ThreePointArc((32.010723984, -22.111229048), (30.596510422, -22.697015485), (29.18229686, -22.111229048))
            Line((29.18229686, -22.111229048), (26.180194847, -19.109127035))
            Line((26.180194847, -19.109127035), (19.109127035, -26.180194847))
            Line((19.109127035, -26.180194847), (22.111229048, -29.18229686))
            ThreePointArc((22.111229048, -29.18229686), (22.697015485, -30.596510422), (22.111229048, -32.010723984))
            Line((22.111229048, -32.010723984), (0.971953032, -53.15))
            Line((0.971953032, -53.15), (5.815634483, -57.993681451))
            Line((5.815634483, -57.993681451), (26.954910499, -36.854405435))
            ThreePointArc((26.954910499, -36.854405435), (28.369124062, -36.268618998), (29.783337624, -36.854405435))
            Line((29.783337624, -36.854405435), (50.588190451, -57.659258263))
        make_face()
        with Locations((52.465379323, -52.465379323)):
            Circle(SPLIT1_OUTLINE_R, mode=Mode.SUBTRACT)
    # profile 2 of 2: a face of its own
    with BuildSketch(Plane.XY.offset(SPLIT1_START)):
        Polygon((-11.65, 53.15), (-1.65, 53.15), (-11.65, 70.470508076), (-56.022754551, 114.843262627), (-114.843262627, 56.022754551), (-70.470508076, 11.65), (-53.15, 1.65), (-53.15, 11.65), (-103.354581464, 61.854581464), (-61.854581464, 103.354581464), align=None)
    extrude(amount=SPLIT1_DEPTH, mode=Mode.SUBTRACT)


solid = part.part
